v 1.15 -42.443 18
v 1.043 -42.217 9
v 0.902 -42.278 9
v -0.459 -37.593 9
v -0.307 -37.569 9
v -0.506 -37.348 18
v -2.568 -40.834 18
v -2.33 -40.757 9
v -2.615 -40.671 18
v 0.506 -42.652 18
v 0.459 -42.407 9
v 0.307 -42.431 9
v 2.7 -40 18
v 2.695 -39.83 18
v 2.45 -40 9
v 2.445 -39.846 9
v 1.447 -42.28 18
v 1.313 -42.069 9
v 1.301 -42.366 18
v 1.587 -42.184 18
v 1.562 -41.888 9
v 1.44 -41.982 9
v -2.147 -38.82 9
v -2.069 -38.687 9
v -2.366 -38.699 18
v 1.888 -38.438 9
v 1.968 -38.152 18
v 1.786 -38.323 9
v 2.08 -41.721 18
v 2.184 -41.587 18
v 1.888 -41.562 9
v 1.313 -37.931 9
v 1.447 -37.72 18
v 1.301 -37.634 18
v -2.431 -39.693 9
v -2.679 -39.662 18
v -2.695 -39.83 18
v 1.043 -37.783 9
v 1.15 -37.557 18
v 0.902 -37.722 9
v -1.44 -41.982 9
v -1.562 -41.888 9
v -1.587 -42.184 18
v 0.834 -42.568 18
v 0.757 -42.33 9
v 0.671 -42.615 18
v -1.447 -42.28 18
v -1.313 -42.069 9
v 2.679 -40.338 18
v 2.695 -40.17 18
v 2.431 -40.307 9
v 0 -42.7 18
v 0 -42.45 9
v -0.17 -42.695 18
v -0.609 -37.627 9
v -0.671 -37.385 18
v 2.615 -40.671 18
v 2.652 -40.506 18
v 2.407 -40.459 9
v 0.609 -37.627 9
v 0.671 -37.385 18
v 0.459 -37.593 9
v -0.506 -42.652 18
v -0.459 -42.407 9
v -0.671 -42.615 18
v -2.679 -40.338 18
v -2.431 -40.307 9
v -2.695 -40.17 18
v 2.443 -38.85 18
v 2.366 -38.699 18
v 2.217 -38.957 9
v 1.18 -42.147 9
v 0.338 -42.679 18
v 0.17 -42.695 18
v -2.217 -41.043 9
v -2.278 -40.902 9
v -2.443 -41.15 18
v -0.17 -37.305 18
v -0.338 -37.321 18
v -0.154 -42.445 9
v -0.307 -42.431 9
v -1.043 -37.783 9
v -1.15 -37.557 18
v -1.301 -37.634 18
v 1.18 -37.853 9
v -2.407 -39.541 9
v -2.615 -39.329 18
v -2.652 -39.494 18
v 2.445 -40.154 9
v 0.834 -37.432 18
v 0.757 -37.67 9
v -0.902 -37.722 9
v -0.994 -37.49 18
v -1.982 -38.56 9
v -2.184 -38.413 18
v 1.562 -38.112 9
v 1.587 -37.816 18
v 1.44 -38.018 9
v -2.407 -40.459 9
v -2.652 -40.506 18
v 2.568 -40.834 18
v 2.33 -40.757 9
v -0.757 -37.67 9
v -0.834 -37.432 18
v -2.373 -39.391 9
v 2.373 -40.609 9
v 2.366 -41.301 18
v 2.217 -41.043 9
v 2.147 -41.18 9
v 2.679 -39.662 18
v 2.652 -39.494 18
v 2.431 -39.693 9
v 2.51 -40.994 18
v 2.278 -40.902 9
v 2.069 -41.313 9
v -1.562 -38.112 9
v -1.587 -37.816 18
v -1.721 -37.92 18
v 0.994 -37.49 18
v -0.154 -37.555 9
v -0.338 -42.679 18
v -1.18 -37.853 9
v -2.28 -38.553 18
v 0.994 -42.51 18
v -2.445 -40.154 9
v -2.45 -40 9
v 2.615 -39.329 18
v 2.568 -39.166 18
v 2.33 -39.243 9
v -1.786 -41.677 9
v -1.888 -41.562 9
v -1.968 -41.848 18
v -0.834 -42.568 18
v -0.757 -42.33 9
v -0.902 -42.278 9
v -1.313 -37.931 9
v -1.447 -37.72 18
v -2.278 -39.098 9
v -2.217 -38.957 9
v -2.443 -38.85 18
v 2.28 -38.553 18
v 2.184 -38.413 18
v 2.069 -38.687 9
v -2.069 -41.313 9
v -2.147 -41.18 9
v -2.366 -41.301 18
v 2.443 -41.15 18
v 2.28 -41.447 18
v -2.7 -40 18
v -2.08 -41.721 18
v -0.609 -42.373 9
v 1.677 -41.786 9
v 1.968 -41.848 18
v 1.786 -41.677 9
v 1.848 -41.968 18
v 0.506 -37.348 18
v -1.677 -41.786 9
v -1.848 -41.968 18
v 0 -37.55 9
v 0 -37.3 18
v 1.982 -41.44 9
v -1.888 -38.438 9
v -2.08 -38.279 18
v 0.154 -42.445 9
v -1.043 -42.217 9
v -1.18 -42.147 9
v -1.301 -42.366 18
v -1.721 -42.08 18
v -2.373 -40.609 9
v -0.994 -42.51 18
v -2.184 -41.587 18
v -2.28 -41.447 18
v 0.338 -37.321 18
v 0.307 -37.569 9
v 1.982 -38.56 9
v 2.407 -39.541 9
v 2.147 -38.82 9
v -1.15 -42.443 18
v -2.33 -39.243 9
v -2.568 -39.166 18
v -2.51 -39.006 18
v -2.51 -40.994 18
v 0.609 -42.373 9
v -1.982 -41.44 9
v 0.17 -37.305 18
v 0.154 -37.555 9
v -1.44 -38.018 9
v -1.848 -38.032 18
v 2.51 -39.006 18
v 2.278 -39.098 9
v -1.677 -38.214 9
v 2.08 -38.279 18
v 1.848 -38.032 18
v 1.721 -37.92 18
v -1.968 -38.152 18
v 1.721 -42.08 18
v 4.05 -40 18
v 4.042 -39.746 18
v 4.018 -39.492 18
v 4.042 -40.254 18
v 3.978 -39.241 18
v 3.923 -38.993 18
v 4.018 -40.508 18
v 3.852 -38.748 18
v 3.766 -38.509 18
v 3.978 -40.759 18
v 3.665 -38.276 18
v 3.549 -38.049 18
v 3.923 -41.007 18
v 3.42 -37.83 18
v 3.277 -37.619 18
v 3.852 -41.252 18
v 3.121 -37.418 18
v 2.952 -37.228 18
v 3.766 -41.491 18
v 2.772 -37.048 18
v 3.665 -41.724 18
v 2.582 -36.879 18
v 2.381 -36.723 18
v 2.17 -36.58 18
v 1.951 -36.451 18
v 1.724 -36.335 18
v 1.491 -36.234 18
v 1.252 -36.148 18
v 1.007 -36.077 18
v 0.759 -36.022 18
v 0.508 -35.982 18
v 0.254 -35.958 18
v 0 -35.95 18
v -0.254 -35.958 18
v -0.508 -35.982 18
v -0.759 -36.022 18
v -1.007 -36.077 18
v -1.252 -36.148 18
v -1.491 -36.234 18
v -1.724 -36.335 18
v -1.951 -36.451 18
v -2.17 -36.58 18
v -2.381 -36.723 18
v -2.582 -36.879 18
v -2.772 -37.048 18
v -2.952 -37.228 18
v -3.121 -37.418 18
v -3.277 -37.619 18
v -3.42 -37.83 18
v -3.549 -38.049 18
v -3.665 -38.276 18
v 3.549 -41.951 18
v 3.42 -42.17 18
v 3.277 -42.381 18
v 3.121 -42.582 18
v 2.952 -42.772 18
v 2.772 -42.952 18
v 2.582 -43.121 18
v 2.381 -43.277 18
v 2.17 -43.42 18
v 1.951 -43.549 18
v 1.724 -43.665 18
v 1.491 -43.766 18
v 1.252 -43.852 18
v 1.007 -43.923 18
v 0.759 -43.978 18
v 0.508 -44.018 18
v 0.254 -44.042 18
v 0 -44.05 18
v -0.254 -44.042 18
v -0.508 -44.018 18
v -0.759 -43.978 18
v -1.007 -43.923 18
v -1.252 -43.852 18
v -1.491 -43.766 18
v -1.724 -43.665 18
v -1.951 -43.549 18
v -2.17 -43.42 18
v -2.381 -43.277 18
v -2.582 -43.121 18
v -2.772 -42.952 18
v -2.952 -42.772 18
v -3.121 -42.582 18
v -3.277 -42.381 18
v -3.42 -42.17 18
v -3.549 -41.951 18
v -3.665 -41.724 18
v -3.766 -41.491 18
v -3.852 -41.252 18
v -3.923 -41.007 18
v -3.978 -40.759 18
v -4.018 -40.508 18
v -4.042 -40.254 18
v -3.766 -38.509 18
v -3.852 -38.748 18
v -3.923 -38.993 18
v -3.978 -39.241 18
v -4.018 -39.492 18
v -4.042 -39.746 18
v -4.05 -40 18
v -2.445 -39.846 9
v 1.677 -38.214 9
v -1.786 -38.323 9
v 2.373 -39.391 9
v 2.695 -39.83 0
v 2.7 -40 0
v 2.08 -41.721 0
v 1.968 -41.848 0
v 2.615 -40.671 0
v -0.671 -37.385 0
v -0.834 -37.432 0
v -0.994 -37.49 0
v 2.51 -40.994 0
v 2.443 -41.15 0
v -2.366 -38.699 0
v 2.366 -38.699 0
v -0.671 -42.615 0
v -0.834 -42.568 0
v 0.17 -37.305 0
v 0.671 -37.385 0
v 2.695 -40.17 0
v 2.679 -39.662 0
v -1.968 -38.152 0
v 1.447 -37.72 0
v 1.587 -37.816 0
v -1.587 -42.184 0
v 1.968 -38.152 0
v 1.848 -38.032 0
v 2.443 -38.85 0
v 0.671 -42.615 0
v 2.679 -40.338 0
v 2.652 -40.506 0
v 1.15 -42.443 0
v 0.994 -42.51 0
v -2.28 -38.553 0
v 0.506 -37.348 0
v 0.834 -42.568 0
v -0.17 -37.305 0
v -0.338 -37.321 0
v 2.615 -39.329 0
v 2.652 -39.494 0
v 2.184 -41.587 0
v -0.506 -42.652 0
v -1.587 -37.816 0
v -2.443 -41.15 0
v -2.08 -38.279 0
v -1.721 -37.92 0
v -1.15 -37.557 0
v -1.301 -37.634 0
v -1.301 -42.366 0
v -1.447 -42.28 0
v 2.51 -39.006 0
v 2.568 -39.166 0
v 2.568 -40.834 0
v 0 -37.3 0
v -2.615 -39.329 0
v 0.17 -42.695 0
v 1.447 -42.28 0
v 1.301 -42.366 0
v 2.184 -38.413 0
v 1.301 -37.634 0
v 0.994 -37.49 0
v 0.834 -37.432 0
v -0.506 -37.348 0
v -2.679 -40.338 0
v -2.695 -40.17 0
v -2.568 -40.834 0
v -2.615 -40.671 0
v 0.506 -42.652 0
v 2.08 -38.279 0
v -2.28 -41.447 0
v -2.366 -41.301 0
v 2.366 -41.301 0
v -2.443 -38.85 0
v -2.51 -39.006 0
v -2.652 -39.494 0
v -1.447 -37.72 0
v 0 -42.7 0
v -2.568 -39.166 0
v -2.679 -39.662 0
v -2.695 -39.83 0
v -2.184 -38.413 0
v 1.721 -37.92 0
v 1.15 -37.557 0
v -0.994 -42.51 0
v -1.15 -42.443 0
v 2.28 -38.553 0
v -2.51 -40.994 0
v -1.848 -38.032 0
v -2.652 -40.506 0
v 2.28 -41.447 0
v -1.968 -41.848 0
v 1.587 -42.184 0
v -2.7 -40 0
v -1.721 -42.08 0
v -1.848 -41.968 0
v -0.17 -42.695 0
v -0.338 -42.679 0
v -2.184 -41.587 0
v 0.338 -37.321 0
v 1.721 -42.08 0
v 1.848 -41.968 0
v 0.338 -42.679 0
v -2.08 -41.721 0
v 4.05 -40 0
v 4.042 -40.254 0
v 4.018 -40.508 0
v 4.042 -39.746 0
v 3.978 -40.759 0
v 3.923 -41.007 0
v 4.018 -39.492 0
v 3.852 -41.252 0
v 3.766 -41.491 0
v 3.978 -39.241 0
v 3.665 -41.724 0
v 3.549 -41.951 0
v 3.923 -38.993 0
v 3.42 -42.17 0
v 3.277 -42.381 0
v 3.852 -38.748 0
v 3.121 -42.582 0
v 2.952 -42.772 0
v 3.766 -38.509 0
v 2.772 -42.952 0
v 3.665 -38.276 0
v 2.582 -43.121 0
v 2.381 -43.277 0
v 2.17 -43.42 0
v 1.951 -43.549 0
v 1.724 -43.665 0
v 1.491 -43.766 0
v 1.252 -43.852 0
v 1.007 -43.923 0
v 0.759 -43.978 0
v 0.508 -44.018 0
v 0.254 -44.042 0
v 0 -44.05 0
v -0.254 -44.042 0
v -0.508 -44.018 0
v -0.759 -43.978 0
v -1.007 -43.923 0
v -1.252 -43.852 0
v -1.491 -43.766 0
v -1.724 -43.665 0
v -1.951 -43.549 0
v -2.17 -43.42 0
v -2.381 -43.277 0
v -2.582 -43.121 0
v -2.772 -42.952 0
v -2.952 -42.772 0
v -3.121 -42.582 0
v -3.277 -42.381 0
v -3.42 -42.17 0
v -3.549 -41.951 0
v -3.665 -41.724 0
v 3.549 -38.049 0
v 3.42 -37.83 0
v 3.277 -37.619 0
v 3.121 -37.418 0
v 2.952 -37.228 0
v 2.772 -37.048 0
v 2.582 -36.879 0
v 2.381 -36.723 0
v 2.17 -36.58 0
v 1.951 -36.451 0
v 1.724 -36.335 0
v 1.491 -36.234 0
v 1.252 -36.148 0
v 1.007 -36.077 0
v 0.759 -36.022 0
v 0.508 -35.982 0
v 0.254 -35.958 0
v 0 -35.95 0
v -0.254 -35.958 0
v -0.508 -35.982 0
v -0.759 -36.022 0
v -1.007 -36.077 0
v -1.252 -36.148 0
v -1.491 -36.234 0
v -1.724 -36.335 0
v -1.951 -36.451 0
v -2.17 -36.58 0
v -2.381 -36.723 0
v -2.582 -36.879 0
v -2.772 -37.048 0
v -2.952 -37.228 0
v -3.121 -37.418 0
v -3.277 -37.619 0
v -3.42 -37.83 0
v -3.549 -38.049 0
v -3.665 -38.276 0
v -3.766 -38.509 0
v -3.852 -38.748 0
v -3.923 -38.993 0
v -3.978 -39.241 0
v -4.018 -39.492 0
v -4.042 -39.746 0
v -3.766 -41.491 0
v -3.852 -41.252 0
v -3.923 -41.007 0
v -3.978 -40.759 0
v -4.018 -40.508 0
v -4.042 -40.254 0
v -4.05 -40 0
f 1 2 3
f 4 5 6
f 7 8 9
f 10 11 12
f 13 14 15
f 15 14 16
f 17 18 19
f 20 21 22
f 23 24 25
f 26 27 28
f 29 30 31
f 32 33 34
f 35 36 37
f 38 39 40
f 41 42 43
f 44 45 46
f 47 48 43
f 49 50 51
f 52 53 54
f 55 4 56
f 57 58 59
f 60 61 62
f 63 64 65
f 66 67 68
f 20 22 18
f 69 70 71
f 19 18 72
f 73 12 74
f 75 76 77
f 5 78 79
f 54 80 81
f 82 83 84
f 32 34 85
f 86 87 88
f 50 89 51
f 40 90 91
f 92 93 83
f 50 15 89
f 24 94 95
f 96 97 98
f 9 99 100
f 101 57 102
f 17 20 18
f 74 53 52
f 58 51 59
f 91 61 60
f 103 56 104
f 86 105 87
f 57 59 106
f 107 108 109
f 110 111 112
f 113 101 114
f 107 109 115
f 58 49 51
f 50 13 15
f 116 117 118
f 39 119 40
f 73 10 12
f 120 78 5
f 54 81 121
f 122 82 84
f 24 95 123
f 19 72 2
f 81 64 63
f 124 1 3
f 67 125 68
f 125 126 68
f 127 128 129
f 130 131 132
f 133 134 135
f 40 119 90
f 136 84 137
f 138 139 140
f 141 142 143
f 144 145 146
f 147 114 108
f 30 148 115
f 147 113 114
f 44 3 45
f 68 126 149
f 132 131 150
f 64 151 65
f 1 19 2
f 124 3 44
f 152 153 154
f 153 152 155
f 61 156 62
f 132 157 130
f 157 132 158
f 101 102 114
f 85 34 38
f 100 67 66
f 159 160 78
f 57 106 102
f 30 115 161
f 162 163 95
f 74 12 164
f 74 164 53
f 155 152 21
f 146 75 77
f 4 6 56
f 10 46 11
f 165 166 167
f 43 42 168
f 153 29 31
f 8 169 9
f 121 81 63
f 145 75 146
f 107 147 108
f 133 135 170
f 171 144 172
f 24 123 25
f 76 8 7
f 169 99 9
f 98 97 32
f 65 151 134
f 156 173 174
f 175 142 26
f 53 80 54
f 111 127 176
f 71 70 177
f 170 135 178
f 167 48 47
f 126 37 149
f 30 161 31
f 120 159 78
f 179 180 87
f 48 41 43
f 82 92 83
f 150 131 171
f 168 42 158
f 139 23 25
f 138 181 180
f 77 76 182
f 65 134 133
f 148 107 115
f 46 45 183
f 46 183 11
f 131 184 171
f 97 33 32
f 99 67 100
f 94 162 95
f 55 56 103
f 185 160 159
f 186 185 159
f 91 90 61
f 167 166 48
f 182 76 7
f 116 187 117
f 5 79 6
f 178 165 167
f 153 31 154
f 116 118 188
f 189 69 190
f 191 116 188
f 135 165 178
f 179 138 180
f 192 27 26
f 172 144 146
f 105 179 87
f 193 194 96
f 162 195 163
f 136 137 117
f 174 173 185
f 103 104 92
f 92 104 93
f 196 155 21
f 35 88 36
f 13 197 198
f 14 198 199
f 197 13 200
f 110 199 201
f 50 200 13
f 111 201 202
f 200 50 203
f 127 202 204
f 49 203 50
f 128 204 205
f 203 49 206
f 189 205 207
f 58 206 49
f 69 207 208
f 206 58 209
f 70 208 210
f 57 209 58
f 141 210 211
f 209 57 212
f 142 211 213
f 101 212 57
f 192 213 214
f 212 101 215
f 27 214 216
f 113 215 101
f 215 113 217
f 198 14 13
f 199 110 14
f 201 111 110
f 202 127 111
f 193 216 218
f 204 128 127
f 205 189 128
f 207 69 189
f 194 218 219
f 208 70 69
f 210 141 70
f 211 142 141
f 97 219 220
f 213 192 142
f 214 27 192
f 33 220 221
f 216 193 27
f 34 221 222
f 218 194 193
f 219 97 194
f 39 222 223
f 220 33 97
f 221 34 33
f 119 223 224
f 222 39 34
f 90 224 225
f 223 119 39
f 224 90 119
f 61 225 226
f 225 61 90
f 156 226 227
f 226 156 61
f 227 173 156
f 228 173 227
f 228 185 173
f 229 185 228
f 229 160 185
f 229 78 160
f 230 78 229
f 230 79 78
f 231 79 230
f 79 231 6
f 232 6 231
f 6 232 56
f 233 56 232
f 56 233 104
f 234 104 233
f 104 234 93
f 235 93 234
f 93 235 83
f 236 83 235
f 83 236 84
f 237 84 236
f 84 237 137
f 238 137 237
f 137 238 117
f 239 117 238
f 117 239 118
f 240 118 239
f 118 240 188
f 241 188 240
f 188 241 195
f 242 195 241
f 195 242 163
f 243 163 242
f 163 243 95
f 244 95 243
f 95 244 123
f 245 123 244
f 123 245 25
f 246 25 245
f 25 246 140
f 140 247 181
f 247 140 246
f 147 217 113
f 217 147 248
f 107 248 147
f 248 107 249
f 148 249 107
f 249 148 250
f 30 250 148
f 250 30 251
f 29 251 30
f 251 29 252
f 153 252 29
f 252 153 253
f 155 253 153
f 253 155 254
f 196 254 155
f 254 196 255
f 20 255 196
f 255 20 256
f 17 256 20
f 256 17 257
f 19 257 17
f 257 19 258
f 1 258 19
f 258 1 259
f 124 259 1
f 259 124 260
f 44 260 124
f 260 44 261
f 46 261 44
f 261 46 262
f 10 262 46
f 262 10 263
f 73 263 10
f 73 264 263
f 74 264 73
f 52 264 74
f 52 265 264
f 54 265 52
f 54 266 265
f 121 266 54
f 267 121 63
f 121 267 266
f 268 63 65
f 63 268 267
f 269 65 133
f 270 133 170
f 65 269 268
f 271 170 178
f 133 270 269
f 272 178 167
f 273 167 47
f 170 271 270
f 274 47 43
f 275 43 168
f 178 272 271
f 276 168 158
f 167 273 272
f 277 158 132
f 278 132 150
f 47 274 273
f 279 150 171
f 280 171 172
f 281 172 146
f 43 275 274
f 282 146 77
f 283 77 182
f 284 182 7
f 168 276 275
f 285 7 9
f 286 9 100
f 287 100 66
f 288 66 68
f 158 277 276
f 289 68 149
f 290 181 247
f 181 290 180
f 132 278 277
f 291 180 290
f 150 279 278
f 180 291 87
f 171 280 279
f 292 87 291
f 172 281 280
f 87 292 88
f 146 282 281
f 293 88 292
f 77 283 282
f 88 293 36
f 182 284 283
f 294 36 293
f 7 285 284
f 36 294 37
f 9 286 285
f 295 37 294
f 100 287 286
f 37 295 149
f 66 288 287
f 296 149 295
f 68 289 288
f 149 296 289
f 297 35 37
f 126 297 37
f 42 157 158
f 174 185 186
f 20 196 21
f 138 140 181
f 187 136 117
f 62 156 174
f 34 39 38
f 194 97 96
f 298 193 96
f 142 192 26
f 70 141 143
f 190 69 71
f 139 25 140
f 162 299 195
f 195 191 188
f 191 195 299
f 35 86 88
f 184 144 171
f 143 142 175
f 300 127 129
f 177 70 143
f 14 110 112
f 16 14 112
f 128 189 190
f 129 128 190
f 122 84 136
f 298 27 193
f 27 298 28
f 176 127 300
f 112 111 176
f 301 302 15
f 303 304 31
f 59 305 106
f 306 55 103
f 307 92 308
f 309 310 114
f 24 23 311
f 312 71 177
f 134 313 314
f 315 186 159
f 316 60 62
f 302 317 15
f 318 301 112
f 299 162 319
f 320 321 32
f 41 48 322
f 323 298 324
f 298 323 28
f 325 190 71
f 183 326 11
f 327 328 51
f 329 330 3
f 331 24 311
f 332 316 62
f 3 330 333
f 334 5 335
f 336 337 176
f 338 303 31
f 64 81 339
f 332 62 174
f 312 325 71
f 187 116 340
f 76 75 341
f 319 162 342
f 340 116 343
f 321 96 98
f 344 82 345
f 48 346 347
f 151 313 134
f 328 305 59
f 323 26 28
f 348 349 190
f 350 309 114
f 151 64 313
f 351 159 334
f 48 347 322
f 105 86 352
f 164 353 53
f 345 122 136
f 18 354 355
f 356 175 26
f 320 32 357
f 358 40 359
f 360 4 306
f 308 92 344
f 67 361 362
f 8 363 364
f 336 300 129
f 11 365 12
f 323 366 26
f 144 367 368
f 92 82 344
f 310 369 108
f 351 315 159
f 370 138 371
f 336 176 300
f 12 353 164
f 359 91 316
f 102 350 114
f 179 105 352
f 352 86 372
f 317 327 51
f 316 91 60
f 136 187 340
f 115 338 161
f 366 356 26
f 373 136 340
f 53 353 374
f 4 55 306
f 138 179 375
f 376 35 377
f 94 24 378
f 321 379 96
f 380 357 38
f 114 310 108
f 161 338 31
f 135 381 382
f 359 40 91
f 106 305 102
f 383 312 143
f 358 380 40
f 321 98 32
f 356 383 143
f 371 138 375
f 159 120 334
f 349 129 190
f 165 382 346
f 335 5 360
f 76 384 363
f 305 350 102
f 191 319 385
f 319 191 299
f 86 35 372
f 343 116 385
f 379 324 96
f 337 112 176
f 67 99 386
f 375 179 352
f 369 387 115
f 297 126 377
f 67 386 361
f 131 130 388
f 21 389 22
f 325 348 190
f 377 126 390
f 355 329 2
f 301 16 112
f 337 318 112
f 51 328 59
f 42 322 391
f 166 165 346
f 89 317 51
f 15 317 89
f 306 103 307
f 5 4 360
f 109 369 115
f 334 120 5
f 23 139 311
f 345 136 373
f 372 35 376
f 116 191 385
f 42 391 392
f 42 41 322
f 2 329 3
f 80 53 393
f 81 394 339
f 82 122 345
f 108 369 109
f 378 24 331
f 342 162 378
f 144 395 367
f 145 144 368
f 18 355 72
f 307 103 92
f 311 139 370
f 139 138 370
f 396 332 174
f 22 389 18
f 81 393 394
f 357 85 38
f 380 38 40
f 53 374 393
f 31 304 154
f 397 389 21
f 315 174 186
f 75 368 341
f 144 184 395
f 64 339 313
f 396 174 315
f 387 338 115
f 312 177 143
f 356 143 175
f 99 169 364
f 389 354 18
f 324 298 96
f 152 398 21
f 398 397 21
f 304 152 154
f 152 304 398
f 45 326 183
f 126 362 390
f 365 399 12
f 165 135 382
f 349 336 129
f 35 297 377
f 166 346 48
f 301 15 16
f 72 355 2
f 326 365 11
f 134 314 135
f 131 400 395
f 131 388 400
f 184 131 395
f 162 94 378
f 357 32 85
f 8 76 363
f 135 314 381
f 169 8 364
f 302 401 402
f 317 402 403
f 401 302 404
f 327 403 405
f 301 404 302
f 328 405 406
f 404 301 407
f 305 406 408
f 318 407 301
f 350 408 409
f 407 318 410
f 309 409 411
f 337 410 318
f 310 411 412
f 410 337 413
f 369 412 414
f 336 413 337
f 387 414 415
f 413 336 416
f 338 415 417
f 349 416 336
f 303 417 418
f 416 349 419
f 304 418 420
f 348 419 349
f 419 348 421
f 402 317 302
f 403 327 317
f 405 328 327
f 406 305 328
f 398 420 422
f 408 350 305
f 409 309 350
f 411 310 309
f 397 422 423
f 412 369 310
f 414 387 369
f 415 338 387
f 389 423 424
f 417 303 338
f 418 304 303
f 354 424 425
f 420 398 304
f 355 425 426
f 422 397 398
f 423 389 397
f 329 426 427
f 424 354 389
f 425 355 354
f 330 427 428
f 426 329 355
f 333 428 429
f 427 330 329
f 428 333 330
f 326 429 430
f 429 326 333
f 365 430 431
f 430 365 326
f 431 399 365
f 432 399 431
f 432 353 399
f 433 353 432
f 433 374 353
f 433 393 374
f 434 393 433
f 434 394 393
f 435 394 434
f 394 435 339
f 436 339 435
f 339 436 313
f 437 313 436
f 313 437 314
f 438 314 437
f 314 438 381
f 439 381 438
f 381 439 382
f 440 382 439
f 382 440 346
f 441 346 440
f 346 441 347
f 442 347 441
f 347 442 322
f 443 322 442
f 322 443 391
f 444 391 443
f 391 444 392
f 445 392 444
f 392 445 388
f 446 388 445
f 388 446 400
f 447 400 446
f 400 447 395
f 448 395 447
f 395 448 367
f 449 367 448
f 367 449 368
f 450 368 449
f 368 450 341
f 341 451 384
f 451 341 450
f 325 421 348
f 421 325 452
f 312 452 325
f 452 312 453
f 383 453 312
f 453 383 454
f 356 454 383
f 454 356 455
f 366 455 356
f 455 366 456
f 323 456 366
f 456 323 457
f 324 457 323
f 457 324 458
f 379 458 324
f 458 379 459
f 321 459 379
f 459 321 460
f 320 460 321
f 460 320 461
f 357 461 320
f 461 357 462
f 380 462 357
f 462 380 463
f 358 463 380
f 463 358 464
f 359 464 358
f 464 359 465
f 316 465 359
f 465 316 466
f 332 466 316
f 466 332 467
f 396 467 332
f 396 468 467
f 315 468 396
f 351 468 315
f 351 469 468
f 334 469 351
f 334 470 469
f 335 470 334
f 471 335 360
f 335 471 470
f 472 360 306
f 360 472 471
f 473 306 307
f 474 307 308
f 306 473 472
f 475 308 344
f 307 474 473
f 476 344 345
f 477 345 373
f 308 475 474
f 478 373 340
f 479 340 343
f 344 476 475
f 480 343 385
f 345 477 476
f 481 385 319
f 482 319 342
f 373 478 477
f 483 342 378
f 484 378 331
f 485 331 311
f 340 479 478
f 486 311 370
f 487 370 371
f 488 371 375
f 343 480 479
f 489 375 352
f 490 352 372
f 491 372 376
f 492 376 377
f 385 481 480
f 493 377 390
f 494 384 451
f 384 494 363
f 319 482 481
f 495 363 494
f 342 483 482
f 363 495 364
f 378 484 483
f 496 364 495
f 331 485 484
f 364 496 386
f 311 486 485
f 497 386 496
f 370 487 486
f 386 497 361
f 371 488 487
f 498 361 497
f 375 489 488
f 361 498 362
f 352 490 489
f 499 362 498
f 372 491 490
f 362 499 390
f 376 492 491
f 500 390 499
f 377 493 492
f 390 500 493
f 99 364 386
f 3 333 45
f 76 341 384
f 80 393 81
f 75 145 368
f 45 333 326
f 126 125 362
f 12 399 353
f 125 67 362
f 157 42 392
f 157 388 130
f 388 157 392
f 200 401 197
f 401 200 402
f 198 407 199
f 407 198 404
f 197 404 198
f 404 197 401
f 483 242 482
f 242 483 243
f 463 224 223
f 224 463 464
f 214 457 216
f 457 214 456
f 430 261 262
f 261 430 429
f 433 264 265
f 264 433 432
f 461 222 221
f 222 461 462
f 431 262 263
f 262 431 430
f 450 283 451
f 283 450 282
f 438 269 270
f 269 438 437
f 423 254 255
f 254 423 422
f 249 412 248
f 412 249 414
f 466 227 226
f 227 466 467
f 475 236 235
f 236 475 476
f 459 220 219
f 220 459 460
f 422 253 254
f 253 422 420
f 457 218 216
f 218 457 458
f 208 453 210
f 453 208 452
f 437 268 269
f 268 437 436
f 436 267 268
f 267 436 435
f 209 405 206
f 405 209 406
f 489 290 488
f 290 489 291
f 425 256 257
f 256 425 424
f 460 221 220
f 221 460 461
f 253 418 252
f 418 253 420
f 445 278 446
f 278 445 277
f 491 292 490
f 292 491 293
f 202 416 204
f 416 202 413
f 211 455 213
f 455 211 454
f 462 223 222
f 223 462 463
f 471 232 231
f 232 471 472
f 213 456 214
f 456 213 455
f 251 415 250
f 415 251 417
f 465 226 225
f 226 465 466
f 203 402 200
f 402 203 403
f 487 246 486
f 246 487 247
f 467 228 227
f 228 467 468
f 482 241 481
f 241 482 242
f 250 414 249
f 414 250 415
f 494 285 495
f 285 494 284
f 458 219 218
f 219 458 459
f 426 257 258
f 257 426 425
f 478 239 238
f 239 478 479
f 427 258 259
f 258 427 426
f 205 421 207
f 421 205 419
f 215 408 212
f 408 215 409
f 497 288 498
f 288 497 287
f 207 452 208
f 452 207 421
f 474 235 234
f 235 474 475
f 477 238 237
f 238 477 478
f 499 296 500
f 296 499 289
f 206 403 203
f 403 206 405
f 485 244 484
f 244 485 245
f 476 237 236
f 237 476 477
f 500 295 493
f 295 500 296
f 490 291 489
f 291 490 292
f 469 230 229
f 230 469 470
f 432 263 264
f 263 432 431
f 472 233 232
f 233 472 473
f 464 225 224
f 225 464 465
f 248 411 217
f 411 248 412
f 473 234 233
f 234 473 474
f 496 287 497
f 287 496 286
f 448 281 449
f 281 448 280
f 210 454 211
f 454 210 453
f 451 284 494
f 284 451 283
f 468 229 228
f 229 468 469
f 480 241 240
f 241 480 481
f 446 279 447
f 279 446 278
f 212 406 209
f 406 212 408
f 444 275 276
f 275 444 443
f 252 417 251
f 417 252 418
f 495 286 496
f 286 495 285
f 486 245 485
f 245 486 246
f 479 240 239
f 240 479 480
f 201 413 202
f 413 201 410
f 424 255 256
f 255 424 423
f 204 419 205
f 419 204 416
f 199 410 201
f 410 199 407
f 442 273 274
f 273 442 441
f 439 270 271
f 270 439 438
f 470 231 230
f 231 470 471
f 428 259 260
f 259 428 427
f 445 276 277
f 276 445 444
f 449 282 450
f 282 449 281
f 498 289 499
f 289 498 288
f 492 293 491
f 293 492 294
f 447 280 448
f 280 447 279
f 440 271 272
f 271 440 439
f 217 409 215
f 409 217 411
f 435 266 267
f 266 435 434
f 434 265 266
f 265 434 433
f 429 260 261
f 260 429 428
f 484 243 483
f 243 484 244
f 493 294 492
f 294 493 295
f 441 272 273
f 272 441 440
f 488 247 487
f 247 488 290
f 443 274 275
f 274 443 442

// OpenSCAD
radio_pajita = 5.4/2;
radio_pajita_medio = 4.9/2;
radio_pajita_grosor = 1.5;
altura = 18;


module step(len, mod)
{
	for (i = [0:$children-1])
		translate([ len*(i - ($children-1)/2), 0, 0 ]) children((i+mod) % $children);
}

for (i = [1:1])
{
	translate([0, -50+i*10, 0]) step(12, i)
	{
    cilindro();
    /*cilindro();
    cilindro();
    cilindro();*/
	}
}

module cilindro() {
  difference() {
		cylinder(r=radio_pajita*radio_pajita_grosor, h=altura, $fn=100);
		cono(radio_pajita, radio_pajita_medio, altura);
  }
	//curva();
}

module curva() {
  union() {
    translate([-0.5, 0, 12.8]) {
      rotate([0, 40, 0]) {
        difference() {
      	   cylinder(r=radio_pajita*radio_pajita_grosor, h=altura-5, $fn=100);
      	   cylinder(r=radio_pajita, h=altura-5, $fn=100);
        }
      }
    }
  }
}


module cono(base, medio, altura_cono) {
	translate([0, 0, altura_cono/2]) {
  	cylinder(r=medio, r2=base, h=altura_cono/2, $fn=100);
	}
  cylinder(r=base, r2=medio, h=altura_cono/2, $fn=100);
}
